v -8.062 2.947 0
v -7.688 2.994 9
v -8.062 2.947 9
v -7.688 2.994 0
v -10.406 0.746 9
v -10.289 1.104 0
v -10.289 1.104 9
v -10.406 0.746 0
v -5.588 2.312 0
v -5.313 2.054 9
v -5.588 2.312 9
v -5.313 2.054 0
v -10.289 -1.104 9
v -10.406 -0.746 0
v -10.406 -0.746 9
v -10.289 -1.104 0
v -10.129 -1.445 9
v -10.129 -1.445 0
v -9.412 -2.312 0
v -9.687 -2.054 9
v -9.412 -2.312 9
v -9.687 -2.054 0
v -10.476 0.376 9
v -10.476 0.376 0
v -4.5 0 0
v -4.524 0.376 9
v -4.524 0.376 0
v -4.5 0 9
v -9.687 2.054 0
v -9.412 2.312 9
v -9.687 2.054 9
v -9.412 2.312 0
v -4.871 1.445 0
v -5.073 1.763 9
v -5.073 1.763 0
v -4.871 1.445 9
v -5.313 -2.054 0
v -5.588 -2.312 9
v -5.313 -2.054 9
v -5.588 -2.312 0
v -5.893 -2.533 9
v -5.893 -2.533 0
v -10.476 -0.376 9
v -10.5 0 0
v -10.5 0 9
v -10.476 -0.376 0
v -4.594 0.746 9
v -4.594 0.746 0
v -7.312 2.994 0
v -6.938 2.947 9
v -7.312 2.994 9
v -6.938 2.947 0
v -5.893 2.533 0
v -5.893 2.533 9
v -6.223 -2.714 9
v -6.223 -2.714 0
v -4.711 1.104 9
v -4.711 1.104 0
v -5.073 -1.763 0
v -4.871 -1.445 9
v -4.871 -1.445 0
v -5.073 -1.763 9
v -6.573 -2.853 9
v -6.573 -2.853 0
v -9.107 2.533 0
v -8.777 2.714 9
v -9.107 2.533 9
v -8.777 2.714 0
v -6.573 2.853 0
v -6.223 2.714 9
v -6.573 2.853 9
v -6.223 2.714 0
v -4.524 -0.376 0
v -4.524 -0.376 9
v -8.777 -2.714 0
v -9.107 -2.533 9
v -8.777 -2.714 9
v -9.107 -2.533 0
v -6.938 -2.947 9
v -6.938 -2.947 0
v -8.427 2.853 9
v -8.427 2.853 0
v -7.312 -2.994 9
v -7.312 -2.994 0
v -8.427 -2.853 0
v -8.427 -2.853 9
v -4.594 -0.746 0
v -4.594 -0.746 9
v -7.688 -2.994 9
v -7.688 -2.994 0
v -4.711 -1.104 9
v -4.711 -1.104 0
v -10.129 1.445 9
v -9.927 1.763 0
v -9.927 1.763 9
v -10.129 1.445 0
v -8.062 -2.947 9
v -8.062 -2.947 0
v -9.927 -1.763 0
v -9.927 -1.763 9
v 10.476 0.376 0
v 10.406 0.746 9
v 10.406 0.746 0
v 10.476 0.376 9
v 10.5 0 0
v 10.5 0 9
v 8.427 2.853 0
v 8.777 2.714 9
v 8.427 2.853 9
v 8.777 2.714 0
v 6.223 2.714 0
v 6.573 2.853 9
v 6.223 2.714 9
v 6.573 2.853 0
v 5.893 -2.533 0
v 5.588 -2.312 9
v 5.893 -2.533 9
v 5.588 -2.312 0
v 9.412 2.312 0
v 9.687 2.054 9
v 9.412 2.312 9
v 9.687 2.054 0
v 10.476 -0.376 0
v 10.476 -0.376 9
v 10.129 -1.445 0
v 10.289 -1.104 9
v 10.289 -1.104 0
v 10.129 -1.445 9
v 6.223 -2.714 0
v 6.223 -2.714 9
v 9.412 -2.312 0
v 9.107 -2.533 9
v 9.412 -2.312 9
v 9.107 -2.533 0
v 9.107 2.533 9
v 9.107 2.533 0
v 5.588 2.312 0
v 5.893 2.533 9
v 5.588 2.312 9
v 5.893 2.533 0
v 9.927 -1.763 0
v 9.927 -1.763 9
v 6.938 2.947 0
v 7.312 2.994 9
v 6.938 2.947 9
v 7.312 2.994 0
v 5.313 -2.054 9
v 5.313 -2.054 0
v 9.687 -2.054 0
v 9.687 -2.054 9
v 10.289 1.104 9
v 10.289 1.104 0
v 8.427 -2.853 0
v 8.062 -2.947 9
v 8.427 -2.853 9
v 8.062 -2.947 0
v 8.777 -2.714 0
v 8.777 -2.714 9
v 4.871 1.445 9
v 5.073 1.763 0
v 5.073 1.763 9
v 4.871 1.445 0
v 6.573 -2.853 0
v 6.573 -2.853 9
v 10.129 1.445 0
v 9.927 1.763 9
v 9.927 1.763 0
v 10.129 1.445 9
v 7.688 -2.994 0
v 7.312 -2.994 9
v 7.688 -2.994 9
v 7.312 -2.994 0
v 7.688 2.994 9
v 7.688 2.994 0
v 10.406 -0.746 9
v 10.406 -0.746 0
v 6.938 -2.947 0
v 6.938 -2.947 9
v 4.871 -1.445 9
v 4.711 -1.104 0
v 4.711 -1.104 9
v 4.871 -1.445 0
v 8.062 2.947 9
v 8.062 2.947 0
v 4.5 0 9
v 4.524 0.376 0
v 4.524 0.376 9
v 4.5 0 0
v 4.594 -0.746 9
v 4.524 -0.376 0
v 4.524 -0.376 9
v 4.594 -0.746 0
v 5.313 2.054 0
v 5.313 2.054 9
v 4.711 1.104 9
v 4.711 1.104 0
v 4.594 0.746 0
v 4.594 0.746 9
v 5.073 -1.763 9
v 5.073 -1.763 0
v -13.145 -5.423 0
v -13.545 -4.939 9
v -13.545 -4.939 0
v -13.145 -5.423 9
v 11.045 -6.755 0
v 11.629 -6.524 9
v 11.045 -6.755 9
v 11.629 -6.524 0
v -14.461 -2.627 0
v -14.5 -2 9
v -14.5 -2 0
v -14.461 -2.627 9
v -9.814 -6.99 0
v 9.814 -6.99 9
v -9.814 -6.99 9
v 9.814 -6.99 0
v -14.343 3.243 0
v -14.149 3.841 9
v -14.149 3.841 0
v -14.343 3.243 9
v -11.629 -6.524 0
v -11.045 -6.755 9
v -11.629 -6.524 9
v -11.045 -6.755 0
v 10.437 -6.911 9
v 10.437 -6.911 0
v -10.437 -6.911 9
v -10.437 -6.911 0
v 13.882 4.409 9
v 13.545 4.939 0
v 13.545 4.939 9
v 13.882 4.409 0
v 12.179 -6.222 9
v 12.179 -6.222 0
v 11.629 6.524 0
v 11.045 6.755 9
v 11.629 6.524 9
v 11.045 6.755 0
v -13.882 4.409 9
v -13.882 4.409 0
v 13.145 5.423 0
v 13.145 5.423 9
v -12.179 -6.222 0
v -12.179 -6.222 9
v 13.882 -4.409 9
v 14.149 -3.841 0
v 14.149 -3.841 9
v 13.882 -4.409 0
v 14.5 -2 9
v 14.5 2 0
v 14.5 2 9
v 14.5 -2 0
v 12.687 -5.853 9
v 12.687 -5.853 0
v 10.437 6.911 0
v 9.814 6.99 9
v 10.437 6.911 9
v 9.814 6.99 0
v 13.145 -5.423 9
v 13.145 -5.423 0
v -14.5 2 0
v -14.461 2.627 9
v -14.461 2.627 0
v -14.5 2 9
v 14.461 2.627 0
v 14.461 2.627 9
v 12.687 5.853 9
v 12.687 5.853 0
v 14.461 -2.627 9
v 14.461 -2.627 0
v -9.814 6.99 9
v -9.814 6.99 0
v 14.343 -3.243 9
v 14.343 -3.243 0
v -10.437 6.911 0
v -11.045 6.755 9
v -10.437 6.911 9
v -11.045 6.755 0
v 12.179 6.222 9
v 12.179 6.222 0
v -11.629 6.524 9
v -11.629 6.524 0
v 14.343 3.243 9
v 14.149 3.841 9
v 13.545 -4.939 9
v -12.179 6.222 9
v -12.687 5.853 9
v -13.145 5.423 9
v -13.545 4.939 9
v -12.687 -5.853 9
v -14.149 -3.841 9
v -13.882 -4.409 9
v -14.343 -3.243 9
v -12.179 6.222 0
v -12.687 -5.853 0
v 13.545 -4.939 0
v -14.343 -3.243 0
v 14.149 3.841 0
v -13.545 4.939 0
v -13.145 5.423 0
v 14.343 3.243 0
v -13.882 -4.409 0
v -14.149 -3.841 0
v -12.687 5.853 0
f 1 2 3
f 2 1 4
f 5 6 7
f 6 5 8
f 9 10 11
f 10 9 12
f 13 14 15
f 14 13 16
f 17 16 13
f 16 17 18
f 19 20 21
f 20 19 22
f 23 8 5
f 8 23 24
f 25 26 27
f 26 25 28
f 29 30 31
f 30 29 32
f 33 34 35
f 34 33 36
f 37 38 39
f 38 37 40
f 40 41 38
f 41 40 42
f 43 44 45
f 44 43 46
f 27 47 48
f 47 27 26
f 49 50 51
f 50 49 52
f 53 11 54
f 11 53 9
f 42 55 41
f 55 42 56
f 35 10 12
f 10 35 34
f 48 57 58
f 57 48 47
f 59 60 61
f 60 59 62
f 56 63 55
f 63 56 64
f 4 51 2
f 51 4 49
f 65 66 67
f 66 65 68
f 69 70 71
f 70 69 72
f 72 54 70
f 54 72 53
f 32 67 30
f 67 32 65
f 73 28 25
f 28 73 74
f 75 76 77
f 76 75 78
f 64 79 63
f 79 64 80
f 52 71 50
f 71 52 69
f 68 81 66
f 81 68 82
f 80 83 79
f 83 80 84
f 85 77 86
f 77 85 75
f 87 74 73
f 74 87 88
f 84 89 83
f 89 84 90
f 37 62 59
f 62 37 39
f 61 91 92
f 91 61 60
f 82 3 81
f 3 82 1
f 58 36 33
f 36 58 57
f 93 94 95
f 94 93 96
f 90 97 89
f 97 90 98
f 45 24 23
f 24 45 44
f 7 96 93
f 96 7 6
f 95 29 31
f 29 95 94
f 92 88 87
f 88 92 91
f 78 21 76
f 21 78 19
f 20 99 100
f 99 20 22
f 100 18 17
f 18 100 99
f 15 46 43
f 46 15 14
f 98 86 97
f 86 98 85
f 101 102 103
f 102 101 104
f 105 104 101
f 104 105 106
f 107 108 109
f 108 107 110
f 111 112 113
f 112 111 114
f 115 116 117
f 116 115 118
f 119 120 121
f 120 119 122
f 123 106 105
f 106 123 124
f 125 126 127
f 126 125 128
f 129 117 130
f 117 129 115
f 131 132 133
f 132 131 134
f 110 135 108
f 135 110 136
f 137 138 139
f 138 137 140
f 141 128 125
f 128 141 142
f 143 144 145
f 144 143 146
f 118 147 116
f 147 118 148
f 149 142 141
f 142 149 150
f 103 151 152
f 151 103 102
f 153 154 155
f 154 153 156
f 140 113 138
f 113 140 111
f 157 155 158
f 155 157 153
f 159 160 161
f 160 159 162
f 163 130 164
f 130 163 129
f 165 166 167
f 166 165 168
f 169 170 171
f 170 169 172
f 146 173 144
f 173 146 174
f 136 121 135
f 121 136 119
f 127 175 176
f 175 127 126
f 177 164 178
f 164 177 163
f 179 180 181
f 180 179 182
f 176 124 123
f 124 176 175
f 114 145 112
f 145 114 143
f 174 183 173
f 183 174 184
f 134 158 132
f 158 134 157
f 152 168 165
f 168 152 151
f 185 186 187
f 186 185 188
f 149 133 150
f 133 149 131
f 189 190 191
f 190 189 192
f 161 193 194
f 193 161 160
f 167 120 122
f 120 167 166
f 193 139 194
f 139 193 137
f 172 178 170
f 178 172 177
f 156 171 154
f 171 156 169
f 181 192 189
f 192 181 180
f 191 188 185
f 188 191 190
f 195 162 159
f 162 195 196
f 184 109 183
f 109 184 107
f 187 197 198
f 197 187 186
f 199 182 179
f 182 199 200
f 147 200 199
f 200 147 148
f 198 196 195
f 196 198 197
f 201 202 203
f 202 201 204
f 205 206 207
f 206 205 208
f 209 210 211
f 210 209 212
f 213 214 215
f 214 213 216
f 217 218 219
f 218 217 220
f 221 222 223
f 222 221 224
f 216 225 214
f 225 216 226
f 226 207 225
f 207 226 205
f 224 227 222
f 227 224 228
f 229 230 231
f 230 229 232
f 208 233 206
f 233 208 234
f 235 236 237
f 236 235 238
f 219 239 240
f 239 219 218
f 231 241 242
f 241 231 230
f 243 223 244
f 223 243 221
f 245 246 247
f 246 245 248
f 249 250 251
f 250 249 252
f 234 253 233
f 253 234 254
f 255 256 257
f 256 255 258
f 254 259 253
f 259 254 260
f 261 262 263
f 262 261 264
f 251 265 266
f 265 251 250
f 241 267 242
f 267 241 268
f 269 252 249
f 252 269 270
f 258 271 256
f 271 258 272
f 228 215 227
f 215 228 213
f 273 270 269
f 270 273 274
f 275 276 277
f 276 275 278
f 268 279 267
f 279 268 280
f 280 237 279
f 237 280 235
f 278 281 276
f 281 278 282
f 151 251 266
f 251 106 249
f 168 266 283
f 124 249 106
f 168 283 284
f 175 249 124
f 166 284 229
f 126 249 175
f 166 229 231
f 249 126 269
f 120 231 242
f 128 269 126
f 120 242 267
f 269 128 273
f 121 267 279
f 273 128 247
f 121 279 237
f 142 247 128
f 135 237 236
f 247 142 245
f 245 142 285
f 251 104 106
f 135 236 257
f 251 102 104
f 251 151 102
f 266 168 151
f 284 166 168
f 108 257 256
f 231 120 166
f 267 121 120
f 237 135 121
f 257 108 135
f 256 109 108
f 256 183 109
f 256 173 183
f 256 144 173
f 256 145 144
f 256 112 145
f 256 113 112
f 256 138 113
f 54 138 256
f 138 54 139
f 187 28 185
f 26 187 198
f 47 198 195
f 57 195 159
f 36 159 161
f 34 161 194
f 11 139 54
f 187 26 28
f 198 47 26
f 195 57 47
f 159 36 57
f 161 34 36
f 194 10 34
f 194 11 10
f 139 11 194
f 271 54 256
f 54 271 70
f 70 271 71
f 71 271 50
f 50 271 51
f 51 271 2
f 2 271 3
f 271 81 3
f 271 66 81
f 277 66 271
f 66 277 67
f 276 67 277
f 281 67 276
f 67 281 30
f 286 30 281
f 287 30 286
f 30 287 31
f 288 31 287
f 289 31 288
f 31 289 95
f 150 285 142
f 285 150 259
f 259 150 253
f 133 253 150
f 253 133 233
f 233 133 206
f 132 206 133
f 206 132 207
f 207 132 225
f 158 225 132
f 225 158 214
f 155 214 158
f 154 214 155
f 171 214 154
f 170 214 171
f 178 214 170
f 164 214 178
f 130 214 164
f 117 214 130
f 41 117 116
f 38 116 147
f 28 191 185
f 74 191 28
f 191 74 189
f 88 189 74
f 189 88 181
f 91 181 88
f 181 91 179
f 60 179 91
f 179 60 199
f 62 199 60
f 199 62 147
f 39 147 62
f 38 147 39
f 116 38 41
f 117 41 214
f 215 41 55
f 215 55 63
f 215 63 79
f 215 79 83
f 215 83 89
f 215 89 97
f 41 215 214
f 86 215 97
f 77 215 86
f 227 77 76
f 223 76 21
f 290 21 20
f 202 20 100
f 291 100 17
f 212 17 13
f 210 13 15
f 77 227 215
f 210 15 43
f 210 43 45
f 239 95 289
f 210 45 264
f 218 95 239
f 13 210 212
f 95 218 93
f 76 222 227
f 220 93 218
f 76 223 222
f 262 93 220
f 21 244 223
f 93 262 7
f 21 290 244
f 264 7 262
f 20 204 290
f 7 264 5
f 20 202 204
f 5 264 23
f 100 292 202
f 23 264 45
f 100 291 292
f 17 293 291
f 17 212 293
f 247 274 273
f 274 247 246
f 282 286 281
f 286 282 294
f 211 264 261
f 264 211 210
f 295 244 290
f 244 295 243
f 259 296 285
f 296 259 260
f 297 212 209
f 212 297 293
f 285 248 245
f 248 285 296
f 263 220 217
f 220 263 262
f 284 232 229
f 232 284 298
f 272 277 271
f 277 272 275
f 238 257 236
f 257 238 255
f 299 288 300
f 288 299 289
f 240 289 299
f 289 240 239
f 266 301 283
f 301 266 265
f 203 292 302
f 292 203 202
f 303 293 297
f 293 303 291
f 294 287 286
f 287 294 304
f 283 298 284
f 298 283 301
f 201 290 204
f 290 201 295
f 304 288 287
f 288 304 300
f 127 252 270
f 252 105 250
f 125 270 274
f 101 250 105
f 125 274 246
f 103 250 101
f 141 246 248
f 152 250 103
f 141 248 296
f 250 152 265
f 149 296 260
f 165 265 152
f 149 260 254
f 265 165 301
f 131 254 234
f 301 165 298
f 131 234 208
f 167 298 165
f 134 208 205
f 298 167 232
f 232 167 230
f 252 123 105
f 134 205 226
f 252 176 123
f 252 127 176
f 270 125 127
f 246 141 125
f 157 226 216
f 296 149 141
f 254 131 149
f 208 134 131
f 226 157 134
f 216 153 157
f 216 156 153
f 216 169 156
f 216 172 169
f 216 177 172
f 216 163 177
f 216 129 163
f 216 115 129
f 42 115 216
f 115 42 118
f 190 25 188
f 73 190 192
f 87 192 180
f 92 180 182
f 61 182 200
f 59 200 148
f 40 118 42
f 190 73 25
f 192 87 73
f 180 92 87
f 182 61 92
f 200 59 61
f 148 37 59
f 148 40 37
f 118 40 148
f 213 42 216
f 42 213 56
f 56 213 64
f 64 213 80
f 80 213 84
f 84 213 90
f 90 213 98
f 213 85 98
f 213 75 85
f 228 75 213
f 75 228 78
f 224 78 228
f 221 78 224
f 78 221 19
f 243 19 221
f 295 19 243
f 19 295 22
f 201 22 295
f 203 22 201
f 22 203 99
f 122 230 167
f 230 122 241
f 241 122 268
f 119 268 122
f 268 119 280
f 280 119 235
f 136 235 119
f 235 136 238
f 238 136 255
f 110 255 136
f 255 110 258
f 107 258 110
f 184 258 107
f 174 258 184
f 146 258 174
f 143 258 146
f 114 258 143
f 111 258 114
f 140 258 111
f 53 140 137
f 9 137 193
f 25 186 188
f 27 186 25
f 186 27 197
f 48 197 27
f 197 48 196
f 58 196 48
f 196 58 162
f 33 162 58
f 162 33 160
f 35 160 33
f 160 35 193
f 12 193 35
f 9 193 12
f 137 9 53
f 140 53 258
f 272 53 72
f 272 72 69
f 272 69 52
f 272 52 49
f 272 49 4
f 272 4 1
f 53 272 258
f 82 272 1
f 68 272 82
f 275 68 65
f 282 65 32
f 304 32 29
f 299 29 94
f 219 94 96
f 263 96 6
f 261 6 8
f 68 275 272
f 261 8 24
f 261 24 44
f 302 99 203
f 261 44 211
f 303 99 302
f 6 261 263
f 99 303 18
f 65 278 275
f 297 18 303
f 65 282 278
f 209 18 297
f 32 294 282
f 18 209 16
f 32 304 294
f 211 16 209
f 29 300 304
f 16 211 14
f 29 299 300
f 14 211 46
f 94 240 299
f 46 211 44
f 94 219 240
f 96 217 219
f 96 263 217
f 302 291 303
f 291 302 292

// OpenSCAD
$fn = 50;


difference() {
	union() {
		hull() {
			translate(v = [-9.5000000000, 2.0000000000, 0]) {
				cylinder(h = 9, r = 5);
			}
			translate(v = [9.5000000000, 2.0000000000, 0]) {
				cylinder(h = 9, r = 5);
			}
			translate(v = [-9.5000000000, -2.0000000000, 0]) {
				cylinder(h = 9, r = 5);
			}
			translate(v = [9.5000000000, -2.0000000000, 0]) {
				cylinder(h = 9, r = 5);
			}
		}
	}
	union() {
		translate(v = [-7.5000000000, 0.0000000000, 0]) {
			translate(v = [0, 0, -100]) {
				cylinder(h = 200, r = 3.0000000000);
			}
		}
		translate(v = [7.5000000000, 0.0000000000, 0]) {
			translate(v = [0, 0, -100]) {
				cylinder(h = 200, r = 3.0000000000);
			}
		}
	}
}
